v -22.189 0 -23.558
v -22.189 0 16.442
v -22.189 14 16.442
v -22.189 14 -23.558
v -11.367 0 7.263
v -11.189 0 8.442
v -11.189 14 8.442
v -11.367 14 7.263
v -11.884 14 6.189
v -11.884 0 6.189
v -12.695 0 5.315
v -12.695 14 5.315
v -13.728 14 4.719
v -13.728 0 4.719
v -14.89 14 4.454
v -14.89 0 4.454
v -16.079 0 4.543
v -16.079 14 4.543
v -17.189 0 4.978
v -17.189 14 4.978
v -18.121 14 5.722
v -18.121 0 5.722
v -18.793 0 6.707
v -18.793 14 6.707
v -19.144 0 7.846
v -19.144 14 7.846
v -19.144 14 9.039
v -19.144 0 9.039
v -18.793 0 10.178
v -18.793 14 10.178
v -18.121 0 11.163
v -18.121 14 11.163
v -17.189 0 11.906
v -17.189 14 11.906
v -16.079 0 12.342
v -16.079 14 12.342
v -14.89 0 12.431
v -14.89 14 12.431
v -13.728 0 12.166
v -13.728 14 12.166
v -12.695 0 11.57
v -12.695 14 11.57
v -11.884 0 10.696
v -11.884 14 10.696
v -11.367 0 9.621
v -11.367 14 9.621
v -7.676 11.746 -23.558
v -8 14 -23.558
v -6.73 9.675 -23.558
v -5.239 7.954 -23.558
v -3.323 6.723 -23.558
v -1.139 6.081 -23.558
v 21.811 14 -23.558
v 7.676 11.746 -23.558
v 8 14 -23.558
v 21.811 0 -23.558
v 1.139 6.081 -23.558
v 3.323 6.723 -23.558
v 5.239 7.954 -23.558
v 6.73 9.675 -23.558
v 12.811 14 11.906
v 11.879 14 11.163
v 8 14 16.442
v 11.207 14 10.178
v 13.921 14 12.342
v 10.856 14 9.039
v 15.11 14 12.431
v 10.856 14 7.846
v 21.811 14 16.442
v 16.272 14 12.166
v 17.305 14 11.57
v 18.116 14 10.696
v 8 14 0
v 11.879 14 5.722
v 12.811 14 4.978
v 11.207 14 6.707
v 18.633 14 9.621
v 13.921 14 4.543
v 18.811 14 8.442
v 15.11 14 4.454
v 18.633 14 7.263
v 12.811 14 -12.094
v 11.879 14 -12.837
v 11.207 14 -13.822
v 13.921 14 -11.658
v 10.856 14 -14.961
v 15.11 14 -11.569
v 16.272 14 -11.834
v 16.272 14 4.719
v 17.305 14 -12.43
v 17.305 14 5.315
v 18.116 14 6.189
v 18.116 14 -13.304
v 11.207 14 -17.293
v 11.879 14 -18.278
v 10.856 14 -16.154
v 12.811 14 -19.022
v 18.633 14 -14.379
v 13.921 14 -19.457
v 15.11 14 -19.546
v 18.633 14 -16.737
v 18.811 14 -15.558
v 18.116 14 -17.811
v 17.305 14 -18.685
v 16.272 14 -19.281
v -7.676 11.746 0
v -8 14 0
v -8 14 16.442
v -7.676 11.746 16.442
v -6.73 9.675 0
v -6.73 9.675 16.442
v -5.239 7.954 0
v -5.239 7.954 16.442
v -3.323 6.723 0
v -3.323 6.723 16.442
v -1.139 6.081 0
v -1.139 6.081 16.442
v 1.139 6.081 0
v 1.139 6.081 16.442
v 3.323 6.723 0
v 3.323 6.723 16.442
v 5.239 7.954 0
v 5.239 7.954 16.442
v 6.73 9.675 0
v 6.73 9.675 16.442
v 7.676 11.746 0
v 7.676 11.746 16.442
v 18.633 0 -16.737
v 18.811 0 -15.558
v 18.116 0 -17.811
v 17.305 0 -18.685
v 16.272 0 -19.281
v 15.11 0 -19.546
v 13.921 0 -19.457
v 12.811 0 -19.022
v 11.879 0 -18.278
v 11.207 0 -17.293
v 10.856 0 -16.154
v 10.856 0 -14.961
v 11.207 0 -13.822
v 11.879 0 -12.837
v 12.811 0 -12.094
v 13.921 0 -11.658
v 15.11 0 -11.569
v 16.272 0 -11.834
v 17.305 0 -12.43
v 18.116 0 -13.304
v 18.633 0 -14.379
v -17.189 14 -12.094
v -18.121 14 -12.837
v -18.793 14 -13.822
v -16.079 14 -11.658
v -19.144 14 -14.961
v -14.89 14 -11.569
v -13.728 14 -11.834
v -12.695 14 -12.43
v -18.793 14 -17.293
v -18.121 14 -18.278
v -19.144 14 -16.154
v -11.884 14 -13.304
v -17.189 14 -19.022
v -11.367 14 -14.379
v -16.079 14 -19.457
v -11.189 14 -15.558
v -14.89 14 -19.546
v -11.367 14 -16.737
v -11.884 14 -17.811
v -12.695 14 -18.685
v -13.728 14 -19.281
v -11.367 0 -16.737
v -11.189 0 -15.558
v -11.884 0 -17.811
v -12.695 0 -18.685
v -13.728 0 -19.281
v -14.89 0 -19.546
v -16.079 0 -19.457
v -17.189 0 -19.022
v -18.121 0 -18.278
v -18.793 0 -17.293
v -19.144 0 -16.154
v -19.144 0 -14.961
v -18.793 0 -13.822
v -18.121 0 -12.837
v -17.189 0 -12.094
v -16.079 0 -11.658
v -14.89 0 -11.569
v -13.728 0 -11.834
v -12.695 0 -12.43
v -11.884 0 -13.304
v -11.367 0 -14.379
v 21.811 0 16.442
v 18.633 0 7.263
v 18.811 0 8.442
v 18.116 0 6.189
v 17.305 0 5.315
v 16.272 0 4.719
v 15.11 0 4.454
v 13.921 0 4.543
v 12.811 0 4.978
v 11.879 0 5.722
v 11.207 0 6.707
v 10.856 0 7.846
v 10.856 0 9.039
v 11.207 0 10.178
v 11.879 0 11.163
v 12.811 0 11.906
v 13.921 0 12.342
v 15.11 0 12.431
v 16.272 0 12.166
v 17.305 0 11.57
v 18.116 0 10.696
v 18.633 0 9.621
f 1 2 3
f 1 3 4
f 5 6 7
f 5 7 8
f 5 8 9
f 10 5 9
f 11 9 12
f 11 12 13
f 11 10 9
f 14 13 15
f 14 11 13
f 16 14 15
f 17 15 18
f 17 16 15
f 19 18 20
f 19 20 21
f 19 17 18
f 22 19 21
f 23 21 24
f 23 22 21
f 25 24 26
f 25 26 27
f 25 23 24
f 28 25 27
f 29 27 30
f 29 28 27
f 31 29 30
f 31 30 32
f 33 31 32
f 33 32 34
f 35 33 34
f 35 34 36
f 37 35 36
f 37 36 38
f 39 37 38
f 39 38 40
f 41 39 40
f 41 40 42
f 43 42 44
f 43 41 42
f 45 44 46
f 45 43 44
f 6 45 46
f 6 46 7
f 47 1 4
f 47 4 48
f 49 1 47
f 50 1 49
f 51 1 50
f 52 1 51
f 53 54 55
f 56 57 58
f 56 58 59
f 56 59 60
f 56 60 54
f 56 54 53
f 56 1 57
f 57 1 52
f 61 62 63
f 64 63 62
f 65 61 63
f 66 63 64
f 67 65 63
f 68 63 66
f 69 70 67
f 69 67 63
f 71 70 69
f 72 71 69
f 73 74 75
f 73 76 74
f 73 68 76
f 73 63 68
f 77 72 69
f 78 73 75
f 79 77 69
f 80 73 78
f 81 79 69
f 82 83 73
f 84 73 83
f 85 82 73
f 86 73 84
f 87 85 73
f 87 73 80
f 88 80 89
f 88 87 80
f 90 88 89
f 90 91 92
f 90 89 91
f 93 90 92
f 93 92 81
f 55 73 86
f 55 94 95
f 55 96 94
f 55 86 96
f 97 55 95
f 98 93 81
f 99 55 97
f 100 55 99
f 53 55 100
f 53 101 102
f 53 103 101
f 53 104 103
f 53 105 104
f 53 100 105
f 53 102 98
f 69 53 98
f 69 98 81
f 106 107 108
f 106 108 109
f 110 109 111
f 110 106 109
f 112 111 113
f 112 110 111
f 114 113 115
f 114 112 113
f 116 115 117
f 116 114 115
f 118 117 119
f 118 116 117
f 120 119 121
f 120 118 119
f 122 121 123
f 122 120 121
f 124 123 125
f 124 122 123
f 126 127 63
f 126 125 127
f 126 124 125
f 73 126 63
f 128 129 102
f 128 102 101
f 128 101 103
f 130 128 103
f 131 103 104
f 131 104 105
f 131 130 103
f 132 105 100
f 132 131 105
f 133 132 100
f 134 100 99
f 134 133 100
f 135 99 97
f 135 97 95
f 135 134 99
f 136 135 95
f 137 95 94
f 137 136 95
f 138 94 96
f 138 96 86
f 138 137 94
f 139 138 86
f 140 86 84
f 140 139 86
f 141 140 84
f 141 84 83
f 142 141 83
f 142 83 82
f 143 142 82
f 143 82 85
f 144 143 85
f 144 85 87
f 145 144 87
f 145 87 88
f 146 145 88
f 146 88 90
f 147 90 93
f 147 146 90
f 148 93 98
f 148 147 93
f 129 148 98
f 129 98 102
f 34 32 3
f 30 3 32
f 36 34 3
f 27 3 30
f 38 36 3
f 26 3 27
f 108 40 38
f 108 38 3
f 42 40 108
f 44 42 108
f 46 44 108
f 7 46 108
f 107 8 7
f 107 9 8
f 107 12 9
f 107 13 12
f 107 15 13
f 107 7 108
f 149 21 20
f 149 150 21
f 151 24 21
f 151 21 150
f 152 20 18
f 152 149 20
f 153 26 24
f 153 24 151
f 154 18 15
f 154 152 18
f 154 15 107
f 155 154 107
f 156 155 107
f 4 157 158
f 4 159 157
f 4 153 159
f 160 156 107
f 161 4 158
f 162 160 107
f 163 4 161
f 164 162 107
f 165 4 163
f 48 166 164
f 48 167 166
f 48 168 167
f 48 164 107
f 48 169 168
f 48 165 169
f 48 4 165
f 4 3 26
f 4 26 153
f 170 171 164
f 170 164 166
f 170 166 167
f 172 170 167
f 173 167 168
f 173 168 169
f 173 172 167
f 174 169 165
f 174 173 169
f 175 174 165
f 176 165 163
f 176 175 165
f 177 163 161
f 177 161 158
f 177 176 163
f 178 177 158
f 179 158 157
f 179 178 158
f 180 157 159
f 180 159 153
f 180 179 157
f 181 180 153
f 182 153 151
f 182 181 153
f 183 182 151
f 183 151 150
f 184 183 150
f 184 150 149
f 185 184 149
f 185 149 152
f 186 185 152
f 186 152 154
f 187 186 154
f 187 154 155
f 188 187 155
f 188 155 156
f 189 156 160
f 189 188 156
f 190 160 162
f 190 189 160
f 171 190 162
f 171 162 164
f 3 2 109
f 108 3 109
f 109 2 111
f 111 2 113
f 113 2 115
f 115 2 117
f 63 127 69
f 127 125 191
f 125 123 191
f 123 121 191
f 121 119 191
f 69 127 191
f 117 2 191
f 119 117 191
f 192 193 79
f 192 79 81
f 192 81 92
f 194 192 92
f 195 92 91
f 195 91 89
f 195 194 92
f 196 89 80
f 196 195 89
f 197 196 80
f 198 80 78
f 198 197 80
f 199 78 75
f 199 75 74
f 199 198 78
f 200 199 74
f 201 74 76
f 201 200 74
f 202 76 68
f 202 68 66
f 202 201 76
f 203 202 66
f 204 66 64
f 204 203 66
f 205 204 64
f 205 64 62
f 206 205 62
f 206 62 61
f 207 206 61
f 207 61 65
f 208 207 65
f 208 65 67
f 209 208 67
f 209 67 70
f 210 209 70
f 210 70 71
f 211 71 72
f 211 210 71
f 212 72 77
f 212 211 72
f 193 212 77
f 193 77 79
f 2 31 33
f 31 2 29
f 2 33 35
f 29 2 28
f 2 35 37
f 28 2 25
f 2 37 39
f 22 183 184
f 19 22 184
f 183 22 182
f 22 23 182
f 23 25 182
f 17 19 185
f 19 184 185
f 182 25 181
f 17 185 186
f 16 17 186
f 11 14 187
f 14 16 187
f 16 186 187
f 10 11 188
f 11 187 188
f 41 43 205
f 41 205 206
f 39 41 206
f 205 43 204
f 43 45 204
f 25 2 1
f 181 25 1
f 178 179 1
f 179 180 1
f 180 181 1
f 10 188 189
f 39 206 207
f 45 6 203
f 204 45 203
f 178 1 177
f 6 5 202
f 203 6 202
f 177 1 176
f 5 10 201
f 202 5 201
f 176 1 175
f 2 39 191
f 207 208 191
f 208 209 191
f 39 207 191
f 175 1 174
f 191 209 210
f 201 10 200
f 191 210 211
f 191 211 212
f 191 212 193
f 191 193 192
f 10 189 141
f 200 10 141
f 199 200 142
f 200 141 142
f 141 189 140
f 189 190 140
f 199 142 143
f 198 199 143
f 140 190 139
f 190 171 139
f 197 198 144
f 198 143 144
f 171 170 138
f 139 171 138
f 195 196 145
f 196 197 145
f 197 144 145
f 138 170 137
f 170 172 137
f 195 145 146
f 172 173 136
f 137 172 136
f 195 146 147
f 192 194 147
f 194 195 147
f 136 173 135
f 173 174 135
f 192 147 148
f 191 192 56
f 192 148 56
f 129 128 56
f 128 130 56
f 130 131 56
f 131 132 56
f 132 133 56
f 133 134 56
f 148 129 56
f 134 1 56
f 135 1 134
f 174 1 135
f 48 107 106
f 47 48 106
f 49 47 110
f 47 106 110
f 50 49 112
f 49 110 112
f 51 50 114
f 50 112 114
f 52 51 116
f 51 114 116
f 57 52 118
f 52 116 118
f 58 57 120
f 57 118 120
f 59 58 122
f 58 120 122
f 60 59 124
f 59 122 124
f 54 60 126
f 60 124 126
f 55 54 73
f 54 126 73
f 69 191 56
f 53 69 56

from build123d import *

# Parameters (mm, degrees)
SKETCH1_W                      = 44
SKETCH1_H                      = 40
SKETCH1_R                      = 4
BOSS_EXTRUDE1_DEPTH            = 14
CUT_EXTRUDE1_REACH             = 18.442
SKETCH2_R                      = 8
CUT_EXTRUDE1_DIRECTION_2_REACH = 25.558


with BuildPart() as part:
    # Sketch1 → Boss-Extrude1 (new body)
    with BuildSketch(Plane(origin=(0, 0, 0), x_dir=(1, 0, 0), z_dir=(0, 1, 0))):
        with Locations((-0.188936111, 3.557633072)):
            Rectangle(SKETCH1_W, SKETCH1_H)
        with Locations((14.811063889, -8.442366928)):
            Circle(SKETCH1_R, mode=Mode.SUBTRACT)
        with Locations((14.811063889, 15.557633072)):
            Circle(SKETCH1_R, mode=Mode.SUBTRACT)
        with Locations((-15.188936111, 15.557633072)):
            Circle(SKETCH1_R, mode=Mode.SUBTRACT)
        with Locations((-15.188936111, -8.442366928)):
            Circle(SKETCH1_R, mode=Mode.SUBTRACT)
    extrude(amount=BOSS_EXTRUDE1_DEPTH)

    # Cut-Extrude1: up to this face of the body (flat: up to its plane)
    cut_extrude1_end = Plane(part.part.faces().sort_by_distance((-0.188936111, 7, 16.442366928))[0])
    # Sketch2 → Cut-Extrude1 (cut, up to the picked face)
    with BuildSketch(Plane.XY, mode=Mode.PRIVATE) as cut_extrude1_sk1:
        with Locations((0, 14)):
            Circle(SKETCH2_R)
    cut_extrude1_tool1 = split(extrude(cut_extrude1_sk1.sketch, amount=CUT_EXTRUDE1_REACH, mode=Mode.PRIVATE), bisect_by=cut_extrude1_end, keep=Keep.BOTH, mode=Mode.PRIVATE)
    add(cut_extrude1_tool1.solids().sort_by_distance((0, 14, 0))[0], mode=Mode.SUBTRACT)

    # Cut-Extrude1 direction 2: up to this face of the body (flat: up to its plane)
    cut_extrude1_direction_2_end = Plane(part.part.faces().sort_by_distance((-0.188936111, 7, -23.557633072))[0])
    # Sketch2 → Cut-Extrude1 direction 2 (cut, up to the picked face)
    with BuildSketch(Plane.XY, mode=Mode.PRIVATE) as cut_extrude1_direction_2_sk1:
        with Locations((0, 14)):
            Circle(SKETCH2_R)
    cut_extrude1_direction_2_tool1 = split(extrude(cut_extrude1_direction_2_sk1.sketch, amount=-CUT_EXTRUDE1_DIRECTION_2_REACH, mode=Mode.PRIVATE), bisect_by=cut_extrude1_direction_2_end, keep=Keep.BOTH, mode=Mode.PRIVATE)
    add(cut_extrude1_direction_2_tool1.solids().sort_by_distance((0, 14, 0))[0], mode=Mode.SUBTRACT)


solid = part.part
